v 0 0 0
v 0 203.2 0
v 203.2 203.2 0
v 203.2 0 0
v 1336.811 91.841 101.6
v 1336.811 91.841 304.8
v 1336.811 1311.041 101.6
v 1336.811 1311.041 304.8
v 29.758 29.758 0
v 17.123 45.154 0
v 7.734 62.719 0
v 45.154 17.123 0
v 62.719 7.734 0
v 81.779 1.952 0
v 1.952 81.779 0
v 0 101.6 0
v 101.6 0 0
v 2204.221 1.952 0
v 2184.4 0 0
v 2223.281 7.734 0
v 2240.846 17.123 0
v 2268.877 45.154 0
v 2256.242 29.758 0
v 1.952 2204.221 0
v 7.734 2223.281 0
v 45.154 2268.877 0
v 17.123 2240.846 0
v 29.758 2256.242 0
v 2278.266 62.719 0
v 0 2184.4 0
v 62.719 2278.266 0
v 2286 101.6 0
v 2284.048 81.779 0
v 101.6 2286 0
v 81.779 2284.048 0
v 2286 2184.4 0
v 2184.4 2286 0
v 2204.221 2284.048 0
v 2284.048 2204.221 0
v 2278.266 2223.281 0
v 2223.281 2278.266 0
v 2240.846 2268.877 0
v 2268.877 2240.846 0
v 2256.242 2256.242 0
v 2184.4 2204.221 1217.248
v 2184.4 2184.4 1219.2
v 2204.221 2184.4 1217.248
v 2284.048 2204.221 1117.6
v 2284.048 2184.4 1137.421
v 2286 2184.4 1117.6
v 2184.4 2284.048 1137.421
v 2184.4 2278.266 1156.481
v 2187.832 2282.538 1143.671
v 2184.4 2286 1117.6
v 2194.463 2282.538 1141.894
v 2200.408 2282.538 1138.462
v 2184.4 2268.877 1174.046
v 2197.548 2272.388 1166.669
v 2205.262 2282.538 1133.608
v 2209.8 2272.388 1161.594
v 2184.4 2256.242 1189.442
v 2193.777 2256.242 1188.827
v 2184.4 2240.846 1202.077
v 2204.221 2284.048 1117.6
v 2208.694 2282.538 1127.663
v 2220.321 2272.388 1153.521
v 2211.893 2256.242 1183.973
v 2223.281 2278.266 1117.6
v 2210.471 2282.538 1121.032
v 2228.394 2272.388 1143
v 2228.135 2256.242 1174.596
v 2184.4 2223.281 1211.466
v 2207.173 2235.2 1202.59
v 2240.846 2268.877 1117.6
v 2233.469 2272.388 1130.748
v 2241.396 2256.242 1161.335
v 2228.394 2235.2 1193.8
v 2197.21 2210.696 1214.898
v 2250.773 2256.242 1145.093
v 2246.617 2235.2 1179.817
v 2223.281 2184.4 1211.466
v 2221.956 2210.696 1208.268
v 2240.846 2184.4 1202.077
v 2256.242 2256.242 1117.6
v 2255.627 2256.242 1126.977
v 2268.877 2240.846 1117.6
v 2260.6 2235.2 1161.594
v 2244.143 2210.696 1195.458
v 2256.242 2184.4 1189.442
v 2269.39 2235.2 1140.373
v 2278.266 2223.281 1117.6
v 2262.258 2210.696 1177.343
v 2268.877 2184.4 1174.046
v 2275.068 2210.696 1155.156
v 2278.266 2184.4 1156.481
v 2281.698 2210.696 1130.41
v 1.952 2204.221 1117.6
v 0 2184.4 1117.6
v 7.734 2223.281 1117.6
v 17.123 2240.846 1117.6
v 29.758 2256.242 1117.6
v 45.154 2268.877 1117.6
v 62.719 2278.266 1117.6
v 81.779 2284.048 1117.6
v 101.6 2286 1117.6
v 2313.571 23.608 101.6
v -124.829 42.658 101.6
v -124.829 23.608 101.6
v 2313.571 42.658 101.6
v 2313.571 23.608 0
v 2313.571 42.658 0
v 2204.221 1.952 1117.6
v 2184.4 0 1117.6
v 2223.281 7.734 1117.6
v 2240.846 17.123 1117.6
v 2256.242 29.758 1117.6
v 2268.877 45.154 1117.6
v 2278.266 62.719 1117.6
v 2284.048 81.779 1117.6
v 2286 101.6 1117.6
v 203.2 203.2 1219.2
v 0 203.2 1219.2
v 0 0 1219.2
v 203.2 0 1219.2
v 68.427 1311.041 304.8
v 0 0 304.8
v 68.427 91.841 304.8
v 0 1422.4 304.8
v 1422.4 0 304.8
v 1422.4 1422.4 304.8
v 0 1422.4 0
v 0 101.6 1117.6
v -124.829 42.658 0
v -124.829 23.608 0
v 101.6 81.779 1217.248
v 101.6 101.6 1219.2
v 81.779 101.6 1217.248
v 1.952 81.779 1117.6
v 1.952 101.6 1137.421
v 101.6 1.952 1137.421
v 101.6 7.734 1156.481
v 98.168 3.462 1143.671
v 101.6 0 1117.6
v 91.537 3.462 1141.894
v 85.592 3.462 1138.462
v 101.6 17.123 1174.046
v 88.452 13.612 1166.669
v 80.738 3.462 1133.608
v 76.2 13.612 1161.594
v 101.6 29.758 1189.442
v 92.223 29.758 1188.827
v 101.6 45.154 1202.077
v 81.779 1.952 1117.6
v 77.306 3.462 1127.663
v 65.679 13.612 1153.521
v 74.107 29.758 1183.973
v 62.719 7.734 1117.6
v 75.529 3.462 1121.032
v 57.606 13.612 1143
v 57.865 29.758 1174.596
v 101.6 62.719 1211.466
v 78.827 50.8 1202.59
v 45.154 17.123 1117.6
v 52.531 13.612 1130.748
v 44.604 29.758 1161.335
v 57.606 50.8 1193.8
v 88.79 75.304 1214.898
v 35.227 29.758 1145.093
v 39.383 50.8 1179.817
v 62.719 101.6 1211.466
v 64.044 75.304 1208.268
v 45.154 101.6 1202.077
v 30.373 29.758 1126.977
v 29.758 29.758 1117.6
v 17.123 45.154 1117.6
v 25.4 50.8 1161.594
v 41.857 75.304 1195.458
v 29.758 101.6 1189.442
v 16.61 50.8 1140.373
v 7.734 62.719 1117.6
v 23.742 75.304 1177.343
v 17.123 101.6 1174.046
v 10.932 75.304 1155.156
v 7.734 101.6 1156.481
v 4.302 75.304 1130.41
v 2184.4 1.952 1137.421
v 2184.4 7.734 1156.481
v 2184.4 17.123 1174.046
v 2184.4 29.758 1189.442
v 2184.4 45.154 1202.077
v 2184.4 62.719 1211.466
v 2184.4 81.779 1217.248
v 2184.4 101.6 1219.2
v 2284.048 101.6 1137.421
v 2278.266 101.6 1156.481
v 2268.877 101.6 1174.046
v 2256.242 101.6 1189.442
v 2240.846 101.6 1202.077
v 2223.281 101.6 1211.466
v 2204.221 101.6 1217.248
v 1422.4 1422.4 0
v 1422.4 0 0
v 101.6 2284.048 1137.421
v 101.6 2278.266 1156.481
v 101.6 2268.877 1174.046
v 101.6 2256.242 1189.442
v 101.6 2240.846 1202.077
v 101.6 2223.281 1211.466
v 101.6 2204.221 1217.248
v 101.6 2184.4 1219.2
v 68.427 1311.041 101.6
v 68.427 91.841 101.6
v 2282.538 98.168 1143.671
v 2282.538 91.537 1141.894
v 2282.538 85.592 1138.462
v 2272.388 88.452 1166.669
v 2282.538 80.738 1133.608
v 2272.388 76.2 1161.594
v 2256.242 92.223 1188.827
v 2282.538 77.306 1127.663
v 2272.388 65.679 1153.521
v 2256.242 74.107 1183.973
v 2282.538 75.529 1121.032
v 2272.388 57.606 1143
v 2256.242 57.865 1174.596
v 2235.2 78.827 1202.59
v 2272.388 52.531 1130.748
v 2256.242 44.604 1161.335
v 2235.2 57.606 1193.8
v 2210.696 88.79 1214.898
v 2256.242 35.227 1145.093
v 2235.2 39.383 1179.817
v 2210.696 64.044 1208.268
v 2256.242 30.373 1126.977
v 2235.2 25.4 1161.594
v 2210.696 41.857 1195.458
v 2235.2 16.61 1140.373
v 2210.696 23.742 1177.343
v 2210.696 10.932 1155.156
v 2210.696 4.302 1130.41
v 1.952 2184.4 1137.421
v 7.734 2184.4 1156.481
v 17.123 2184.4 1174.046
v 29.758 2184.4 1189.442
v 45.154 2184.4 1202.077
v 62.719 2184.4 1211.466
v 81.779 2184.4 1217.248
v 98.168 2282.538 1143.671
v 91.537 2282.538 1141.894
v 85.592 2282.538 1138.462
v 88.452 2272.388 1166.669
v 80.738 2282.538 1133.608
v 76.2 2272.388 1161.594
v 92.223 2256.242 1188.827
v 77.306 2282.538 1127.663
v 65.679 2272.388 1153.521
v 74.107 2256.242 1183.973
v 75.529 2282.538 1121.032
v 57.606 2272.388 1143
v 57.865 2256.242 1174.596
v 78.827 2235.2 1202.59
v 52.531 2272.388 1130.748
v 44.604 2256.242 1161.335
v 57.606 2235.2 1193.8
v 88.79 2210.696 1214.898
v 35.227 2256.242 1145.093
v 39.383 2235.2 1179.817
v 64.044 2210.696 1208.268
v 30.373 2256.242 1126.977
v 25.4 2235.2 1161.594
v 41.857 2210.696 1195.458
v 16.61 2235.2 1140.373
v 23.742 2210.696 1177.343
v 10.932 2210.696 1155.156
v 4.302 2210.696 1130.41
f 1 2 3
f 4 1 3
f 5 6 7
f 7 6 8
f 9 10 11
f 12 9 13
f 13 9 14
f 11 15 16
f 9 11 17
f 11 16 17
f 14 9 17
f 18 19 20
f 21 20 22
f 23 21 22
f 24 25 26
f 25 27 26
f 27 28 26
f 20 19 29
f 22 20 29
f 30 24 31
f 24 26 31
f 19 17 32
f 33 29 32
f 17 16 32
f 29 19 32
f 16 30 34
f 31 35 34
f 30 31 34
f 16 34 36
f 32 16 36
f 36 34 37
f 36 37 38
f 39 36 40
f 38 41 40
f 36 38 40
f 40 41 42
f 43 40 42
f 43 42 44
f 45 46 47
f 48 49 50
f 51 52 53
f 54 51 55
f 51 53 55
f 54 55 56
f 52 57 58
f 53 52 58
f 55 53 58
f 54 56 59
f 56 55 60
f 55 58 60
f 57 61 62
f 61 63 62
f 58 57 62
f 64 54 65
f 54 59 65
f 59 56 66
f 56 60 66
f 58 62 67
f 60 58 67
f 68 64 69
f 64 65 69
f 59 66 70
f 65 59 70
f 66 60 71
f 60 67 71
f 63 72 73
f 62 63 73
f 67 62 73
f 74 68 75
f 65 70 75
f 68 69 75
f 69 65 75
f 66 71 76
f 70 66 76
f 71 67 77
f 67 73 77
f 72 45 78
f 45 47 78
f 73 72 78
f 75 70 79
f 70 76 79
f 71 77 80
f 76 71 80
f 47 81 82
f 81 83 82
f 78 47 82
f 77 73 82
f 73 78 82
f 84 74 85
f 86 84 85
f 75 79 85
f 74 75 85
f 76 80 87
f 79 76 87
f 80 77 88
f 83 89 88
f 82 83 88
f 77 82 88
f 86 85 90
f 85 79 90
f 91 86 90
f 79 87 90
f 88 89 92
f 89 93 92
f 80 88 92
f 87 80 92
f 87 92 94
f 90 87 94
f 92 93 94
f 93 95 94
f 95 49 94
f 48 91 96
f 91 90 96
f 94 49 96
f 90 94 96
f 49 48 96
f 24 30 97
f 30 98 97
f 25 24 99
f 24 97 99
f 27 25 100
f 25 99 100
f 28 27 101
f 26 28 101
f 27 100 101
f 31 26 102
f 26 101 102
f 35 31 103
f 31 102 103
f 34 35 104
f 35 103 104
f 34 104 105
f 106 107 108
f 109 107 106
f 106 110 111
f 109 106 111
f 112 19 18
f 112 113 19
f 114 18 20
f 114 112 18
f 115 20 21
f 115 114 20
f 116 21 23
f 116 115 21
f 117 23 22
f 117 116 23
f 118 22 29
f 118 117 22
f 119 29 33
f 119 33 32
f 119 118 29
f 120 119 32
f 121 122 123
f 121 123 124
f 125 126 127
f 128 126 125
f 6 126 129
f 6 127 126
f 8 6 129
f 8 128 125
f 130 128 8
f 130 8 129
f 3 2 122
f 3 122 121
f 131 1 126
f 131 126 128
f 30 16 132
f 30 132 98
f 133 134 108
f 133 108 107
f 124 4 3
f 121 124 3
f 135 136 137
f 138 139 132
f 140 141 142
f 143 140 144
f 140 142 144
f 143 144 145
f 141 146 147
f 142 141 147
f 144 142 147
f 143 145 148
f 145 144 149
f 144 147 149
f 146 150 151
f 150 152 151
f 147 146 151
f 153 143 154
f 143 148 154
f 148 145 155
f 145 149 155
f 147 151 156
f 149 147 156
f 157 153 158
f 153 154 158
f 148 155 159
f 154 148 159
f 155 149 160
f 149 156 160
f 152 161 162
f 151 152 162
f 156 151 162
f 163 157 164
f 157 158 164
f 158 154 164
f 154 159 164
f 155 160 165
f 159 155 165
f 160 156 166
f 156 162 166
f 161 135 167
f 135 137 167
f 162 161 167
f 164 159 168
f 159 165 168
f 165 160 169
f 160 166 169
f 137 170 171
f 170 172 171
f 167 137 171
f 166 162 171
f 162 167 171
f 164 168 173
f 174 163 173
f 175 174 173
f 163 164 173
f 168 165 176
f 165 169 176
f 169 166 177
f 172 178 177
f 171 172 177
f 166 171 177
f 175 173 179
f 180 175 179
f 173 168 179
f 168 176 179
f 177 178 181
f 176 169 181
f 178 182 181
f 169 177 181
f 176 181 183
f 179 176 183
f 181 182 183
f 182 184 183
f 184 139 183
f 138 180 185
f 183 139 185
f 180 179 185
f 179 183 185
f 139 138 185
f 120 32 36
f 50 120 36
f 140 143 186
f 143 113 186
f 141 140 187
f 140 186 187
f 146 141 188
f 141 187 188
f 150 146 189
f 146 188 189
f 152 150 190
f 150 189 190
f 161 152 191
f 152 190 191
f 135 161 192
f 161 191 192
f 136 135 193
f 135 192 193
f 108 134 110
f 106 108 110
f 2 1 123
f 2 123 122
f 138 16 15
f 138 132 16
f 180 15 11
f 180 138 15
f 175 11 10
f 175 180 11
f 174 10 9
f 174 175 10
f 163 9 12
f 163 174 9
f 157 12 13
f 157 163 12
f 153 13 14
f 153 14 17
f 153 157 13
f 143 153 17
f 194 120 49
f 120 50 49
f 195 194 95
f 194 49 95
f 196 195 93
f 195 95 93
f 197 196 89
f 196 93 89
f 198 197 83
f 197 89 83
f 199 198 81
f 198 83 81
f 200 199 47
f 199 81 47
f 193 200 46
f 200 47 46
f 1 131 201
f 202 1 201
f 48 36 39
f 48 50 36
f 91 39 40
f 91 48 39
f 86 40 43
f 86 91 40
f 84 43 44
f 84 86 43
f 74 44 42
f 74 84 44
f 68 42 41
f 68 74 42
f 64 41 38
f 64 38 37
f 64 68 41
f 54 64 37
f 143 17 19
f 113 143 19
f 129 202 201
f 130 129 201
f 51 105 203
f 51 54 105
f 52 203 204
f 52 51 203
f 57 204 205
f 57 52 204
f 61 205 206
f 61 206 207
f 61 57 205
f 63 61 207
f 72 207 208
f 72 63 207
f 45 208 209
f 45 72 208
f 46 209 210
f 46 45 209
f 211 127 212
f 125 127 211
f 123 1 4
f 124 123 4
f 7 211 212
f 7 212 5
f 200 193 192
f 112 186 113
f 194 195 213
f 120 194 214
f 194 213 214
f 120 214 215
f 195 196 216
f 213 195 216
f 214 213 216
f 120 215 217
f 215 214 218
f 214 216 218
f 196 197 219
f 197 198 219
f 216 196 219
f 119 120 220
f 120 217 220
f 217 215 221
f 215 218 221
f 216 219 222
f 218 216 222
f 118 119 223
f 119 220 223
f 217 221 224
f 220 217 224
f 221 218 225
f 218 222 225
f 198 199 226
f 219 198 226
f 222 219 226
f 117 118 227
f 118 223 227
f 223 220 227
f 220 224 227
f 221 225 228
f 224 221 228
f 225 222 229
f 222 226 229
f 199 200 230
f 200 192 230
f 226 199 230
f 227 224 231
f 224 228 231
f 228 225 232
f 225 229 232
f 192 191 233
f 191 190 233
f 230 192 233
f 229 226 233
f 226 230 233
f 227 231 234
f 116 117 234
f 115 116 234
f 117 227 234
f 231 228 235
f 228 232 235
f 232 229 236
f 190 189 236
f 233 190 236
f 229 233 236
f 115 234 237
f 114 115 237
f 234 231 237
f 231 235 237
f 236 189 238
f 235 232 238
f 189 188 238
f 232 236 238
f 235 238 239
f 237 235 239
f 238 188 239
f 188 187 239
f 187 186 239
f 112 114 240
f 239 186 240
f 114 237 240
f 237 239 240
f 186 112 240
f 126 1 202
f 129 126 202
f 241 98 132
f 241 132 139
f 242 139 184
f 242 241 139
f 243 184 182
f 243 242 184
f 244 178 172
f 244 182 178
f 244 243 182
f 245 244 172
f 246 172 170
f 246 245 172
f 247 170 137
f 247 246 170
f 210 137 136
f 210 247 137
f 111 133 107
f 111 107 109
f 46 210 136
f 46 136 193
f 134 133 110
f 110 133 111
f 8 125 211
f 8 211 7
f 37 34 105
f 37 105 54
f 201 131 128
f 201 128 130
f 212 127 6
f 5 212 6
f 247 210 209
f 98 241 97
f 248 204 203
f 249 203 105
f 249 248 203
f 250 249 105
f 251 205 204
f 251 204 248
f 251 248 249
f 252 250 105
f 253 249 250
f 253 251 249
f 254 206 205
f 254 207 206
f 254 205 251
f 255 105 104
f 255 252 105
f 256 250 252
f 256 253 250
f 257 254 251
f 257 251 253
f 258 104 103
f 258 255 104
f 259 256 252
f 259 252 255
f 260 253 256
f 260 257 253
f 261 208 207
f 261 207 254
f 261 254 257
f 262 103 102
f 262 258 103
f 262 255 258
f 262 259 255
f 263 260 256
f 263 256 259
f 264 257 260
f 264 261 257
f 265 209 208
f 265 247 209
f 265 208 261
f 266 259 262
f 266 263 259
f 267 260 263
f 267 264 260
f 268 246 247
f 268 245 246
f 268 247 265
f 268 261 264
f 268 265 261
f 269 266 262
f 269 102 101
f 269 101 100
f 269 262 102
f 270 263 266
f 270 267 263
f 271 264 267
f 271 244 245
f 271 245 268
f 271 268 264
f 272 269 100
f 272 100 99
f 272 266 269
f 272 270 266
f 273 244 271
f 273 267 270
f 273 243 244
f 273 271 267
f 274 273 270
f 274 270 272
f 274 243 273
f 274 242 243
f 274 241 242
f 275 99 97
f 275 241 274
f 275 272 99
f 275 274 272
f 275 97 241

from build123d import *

# Parameters (mm, degrees)
F0_W      = 2438.4
F0_H      = 19.05
F1_DEPTH  = 101.6
F2_W      = 2286
F2_H      = 2286
F3_DEPTH  = 1219.2
F4_R      = 101.6
F5_W      = 203.2
F5_H      = 203.2
F6_DEPTH  = 1219.2
F7_W      = 1422.4
F7_H      = 1422.4
F8_DEPTH  = 304.8
F9_W      = 1268.3842550854
F9_H      = 1219.2
F10_DEPTH = 203.2


with BuildPart() as f1:
    # F0 (on Top) → F1 (new body)
    with BuildSketch(Plane.XY):
        with Locations((1094.3710106479, 33.1334760413)):
            Rectangle(F0_W, F0_H)
    extrude(amount=F1_DEPTH)


with BuildPart() as f3:
    # F2 (on Top) → F3 (new body)
    with BuildSketch(Plane.XY):
        with Locations((1143, 1143)):
            Rectangle(F2_W, F2_H)
    extrude(amount=F3_DEPTH)

    # F4
    f4_edges = [f3.edges().sort_by_distance(p)[0] for p in [
        (0, 1143, 1219.2),
        (1143, 0, 1219.2),
        (2286, 1143, 1219.2),
        (1143, 2286, 1219.2),
        (0, 0, 609.6),
        (2286, 0, 609.6),
        (0, 2286, 609.6),
        (2286, 2286, 609.6),
    ]]
    fillet(f4_edges, radius=F4_R)


with BuildPart() as f6:
    # F5 (on Top) → F6 (new body)
    with BuildSketch(Plane.XY):
        with Locations((101.6, 101.6)):
            Rectangle(F5_W, F5_H)
    extrude(amount=F6_DEPTH)


with BuildPart() as f8:
    # F7 (on Top) → F8 (new body)
    with BuildSketch(Plane.XY):
        with Locations((711.2, 711.2)):
            Rectangle(F7_W, F7_H)
    extrude(amount=F8_DEPTH)

    # F9 (on face) → F10 (cut)
    with BuildSketch(Plane.XY.offset(304.8)):
        with Locations((702.6189863682, 701.4409899712)):
            Rectangle(F9_W, F9_H)
    extrude(amount=-F10_DEPTH, mode=Mode.SUBTRACT)


solid = Compound([f1.part, f3.part, f6.part, f8.part])
